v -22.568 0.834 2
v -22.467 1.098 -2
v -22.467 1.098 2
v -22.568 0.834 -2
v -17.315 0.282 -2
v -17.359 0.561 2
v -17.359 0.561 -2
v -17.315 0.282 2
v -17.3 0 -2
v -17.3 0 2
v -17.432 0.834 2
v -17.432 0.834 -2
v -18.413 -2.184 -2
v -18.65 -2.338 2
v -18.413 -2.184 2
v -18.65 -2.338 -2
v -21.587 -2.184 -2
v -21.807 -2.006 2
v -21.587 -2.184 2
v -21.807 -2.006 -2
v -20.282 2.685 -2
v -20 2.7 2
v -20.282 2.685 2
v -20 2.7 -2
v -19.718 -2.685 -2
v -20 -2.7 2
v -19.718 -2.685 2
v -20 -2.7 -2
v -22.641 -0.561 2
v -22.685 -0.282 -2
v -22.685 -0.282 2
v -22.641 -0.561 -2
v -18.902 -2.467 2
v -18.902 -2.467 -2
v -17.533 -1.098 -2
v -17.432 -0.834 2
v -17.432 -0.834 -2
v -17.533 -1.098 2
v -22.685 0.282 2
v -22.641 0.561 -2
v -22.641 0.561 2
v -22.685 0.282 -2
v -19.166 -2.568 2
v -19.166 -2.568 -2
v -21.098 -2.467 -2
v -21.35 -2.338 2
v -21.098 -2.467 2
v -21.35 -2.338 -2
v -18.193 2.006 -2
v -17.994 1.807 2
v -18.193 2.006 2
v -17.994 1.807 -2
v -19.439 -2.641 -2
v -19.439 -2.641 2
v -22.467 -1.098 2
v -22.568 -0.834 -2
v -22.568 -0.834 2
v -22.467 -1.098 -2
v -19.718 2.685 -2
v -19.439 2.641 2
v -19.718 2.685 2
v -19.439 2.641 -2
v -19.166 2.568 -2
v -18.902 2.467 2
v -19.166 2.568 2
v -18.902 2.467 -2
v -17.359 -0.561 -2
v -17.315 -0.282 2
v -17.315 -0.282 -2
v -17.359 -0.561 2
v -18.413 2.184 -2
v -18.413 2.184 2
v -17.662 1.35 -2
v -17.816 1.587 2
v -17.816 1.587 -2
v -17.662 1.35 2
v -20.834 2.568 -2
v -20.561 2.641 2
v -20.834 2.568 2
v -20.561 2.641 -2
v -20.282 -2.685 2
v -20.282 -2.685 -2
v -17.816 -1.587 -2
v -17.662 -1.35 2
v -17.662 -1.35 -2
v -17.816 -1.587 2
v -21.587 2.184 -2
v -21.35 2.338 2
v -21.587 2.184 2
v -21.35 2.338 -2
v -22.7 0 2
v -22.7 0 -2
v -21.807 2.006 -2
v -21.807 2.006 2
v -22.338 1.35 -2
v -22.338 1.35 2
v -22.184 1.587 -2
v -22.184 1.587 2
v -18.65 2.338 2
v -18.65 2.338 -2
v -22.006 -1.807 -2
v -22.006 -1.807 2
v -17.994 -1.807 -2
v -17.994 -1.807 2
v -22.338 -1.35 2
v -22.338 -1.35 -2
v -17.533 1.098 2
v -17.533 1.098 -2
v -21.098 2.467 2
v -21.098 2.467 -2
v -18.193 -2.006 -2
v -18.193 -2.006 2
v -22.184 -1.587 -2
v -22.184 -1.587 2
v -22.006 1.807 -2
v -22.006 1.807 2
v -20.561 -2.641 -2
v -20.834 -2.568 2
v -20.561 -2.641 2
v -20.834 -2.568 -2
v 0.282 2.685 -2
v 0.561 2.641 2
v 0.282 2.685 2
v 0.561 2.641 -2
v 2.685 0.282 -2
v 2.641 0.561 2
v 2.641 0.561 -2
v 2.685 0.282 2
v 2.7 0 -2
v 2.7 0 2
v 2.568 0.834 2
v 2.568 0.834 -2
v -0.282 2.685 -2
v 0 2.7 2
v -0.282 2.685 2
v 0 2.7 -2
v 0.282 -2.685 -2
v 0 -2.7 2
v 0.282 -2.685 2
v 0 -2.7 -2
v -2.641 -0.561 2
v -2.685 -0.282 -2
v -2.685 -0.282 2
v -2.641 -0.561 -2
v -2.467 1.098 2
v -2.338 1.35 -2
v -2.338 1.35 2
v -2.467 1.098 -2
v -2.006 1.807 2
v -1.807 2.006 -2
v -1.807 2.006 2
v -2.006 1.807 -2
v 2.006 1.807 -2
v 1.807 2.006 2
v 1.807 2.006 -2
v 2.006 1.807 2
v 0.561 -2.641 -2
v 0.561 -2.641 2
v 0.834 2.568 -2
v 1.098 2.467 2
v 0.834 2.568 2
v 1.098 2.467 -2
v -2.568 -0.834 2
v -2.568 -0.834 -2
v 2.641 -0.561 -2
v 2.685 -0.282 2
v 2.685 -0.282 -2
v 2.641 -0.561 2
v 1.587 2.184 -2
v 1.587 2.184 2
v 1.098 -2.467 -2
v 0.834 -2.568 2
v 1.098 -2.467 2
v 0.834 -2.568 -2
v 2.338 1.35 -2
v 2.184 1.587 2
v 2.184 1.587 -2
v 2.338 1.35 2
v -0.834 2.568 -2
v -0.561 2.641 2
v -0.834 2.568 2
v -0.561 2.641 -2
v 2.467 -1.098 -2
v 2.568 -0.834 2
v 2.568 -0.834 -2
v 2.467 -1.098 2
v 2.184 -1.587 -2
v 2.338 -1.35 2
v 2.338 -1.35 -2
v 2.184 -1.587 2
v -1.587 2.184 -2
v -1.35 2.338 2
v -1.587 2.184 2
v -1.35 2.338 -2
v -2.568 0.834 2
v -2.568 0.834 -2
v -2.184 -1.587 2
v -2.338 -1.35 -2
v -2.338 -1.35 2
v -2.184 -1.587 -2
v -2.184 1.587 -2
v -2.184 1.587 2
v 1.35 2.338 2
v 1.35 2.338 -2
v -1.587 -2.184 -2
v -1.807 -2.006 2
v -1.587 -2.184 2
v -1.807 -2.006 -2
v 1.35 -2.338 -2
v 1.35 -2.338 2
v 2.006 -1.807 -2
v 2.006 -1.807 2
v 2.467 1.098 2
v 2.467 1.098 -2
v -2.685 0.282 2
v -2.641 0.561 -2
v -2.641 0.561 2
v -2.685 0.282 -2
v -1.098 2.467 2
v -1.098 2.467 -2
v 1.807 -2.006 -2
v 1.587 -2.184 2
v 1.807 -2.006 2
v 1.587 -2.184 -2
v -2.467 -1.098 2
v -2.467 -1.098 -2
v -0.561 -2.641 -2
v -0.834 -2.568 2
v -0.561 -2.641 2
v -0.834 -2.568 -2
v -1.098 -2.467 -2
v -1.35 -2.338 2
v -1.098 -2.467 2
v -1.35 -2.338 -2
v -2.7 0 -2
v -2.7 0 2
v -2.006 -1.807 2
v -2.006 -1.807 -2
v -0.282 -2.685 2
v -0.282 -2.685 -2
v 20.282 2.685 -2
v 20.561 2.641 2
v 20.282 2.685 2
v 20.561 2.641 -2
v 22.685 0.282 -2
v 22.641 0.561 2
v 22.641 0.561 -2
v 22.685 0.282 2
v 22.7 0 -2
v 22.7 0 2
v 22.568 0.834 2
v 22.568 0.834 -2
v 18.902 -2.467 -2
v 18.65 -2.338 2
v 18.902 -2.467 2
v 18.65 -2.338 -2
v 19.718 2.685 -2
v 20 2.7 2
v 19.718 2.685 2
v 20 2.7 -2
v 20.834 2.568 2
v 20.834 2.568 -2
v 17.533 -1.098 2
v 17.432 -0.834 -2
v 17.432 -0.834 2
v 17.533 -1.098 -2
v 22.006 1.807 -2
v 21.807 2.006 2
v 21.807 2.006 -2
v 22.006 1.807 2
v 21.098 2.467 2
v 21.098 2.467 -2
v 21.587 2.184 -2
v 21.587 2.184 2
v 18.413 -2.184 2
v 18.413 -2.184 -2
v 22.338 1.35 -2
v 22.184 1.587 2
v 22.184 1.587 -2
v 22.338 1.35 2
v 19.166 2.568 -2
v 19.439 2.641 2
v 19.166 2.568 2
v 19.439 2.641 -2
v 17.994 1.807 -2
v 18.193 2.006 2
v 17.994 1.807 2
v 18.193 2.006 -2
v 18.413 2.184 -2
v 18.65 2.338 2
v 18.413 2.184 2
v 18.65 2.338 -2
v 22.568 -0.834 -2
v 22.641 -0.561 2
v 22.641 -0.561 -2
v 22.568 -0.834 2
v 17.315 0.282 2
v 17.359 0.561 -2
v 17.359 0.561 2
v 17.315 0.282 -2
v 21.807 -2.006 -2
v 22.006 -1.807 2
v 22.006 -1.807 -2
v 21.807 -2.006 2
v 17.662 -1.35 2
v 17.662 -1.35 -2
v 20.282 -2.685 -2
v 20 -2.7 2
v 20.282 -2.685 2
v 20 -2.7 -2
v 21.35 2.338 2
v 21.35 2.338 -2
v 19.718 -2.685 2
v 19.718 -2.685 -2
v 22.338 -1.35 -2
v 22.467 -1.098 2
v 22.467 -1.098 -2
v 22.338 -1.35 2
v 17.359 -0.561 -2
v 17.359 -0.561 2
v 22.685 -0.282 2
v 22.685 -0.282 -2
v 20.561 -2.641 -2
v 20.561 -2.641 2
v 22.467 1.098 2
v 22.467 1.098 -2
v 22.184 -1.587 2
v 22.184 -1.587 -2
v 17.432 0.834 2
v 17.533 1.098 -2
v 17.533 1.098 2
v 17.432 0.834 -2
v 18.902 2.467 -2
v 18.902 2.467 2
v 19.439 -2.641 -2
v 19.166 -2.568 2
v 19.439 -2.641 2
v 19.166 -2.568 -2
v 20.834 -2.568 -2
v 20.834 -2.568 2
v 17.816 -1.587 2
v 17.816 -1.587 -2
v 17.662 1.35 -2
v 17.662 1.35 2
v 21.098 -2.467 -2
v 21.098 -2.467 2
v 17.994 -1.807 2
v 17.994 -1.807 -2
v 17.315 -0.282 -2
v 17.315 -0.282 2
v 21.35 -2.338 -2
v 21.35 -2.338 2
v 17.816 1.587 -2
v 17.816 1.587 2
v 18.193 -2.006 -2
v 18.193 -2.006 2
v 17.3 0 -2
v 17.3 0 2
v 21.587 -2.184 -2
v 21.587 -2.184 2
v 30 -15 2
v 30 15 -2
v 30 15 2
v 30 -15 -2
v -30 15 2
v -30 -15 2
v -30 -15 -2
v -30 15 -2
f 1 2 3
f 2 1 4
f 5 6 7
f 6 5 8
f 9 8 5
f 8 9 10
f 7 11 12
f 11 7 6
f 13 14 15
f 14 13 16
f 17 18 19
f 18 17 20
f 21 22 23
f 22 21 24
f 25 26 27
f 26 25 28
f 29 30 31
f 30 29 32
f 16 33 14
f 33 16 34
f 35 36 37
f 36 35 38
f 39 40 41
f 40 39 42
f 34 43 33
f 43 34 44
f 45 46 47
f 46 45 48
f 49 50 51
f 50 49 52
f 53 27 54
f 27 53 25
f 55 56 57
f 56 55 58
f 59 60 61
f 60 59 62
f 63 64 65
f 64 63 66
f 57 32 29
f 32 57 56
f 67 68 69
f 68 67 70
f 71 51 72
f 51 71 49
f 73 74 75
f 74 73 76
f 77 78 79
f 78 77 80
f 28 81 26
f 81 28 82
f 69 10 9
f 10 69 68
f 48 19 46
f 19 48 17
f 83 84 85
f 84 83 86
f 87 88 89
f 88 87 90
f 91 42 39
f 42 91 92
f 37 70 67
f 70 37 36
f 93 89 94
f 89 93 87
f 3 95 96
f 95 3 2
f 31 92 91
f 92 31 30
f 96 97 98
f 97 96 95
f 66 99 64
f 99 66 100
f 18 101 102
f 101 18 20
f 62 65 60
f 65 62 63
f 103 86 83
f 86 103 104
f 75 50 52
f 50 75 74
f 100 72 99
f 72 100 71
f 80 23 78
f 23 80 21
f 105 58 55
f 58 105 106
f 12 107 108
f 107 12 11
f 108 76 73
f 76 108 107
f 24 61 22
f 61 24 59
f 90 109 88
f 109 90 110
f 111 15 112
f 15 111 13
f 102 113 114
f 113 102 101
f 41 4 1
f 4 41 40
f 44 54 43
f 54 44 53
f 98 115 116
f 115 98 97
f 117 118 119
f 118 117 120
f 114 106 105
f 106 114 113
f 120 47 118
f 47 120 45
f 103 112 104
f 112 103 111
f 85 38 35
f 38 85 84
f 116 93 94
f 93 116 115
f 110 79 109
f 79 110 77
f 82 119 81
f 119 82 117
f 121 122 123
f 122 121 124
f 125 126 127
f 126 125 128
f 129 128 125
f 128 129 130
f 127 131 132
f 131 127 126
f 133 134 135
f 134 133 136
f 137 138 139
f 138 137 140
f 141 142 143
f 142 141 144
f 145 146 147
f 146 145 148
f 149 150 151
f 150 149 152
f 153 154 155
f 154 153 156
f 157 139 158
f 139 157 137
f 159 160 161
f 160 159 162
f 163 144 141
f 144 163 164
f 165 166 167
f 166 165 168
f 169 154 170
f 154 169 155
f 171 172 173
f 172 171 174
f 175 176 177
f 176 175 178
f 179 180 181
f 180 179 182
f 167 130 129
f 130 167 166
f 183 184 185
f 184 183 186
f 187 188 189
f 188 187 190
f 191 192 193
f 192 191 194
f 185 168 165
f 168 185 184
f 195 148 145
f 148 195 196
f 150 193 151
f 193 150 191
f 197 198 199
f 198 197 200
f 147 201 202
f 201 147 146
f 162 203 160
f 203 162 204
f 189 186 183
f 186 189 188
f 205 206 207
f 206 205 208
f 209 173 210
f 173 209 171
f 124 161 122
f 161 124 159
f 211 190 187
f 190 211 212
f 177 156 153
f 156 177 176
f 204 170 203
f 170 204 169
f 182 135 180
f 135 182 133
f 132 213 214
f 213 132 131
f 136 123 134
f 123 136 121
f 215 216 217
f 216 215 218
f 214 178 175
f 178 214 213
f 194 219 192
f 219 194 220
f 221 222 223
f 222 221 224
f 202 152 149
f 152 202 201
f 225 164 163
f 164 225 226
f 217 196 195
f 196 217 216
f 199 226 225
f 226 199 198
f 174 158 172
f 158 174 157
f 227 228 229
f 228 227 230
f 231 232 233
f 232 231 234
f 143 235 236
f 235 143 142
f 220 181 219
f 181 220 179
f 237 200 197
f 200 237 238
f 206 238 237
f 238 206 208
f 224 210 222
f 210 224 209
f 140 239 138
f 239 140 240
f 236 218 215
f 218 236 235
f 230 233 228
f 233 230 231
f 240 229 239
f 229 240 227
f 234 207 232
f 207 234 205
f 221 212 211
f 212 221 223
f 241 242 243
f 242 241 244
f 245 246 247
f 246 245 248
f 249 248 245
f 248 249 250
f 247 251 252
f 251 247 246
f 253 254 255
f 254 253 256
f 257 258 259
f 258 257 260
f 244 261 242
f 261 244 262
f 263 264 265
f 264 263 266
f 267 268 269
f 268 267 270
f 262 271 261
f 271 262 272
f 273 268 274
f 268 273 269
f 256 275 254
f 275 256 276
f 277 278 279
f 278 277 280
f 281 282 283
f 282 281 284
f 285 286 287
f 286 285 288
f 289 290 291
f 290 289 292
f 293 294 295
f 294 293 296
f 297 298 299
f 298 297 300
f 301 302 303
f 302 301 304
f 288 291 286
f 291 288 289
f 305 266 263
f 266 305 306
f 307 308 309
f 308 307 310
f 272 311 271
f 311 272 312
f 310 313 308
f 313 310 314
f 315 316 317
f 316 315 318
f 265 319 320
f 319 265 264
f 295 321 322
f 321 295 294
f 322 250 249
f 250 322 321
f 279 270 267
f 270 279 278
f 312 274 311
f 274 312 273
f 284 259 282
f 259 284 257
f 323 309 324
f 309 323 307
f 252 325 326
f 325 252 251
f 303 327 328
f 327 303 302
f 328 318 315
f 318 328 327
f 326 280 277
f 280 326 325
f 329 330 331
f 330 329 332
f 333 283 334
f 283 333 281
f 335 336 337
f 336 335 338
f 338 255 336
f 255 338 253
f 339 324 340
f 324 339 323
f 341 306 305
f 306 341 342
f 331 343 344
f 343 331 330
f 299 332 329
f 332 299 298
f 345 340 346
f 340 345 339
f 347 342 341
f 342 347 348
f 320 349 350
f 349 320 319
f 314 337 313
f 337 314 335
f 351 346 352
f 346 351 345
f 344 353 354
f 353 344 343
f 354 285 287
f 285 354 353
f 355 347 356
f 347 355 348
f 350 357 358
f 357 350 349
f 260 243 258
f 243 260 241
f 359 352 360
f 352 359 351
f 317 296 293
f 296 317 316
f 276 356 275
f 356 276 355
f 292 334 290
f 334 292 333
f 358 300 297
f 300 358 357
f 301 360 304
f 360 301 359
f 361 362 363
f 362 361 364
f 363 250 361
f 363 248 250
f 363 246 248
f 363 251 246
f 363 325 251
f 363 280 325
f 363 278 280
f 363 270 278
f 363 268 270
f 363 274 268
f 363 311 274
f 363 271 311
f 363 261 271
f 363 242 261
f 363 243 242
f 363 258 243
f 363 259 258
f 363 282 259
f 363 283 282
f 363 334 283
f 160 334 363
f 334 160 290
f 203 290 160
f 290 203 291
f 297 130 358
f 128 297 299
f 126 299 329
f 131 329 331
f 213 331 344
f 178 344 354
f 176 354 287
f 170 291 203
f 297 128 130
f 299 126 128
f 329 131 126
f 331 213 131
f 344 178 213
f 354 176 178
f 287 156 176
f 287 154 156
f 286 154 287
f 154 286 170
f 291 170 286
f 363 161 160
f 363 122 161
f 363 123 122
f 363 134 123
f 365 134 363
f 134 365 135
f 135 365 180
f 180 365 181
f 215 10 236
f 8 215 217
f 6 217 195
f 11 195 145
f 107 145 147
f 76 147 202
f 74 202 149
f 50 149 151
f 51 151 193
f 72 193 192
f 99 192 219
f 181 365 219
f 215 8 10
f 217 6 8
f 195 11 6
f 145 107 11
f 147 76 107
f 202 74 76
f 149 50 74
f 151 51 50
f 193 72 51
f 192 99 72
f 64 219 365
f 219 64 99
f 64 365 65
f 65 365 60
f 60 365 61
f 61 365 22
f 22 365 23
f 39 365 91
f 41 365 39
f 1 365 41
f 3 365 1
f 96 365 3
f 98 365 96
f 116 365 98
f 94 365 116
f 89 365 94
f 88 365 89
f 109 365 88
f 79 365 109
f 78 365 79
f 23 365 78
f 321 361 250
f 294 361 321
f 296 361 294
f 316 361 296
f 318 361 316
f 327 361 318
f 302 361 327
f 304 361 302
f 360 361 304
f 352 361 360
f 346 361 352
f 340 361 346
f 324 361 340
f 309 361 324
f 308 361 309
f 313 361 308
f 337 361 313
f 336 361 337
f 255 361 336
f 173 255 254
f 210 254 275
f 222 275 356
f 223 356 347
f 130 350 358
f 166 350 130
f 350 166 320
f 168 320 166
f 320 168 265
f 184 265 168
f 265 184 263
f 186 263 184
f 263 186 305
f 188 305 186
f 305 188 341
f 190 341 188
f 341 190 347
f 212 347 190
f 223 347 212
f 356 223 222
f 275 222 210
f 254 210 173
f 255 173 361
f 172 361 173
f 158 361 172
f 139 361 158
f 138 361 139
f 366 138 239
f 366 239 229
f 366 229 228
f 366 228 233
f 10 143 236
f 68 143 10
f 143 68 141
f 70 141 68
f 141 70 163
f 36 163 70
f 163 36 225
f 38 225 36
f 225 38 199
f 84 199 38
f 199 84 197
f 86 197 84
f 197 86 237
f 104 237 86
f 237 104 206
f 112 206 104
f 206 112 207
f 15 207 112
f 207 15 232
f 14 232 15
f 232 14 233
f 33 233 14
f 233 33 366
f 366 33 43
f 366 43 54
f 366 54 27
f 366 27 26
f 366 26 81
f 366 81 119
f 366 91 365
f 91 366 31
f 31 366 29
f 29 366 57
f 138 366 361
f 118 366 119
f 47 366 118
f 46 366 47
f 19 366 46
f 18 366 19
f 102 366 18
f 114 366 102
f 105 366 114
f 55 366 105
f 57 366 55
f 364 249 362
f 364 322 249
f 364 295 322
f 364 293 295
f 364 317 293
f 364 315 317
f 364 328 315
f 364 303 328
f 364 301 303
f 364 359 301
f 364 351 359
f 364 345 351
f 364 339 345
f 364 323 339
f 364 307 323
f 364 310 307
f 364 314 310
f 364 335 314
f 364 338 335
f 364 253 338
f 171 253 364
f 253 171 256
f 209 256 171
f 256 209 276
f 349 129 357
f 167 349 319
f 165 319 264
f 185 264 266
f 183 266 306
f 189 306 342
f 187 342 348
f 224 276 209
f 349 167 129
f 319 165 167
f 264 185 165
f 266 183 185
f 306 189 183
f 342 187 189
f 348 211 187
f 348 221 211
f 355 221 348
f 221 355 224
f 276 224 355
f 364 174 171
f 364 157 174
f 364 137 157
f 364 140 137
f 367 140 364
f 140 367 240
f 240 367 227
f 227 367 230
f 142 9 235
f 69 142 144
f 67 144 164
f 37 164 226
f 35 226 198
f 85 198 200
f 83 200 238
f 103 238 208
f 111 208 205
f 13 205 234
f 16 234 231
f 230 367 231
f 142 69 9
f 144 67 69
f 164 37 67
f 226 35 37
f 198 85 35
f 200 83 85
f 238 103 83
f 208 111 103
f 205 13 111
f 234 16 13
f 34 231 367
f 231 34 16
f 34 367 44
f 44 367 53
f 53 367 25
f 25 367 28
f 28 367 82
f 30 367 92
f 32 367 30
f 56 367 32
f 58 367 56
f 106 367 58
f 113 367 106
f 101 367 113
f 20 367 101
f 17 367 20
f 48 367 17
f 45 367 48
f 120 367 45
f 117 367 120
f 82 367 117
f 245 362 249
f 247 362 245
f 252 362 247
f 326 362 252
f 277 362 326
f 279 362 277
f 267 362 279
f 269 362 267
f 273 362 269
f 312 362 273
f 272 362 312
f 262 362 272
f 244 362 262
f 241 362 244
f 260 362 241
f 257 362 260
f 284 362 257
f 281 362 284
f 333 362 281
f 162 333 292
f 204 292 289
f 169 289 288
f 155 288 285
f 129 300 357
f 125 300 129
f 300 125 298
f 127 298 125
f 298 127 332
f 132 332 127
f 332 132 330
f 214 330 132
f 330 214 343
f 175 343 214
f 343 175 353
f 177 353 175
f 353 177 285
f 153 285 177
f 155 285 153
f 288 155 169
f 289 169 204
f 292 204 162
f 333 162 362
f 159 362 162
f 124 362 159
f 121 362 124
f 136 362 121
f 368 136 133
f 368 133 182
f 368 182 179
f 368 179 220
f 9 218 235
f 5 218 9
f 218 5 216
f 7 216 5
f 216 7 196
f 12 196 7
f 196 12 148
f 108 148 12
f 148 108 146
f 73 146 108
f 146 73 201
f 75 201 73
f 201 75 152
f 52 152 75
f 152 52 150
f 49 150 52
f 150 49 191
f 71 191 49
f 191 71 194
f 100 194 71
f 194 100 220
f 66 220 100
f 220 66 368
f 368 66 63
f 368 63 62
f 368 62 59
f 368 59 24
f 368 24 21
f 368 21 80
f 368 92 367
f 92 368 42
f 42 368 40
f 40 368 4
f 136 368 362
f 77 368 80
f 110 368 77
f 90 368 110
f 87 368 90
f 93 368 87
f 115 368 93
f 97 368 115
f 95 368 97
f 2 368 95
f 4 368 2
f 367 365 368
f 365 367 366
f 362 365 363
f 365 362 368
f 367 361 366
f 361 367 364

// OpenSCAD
// Multi-hole mounting plate.
$fn = 60;
eps = 0.02;
plate_l = 60;
plate_w = 30;
plate_t = 4;
hole_d = 5.4;
edge = 10;
difference() {
    cube([plate_l, plate_w, plate_t], center = true);
    for (i = [0 : 2])
        translate([-plate_l / 2 + edge + i * (plate_l - 2 * edge) / max(1, 2), 0, -plate_t / 2 - eps])
            cylinder(d = hole_d, h = plate_t + 2 * eps);
}
